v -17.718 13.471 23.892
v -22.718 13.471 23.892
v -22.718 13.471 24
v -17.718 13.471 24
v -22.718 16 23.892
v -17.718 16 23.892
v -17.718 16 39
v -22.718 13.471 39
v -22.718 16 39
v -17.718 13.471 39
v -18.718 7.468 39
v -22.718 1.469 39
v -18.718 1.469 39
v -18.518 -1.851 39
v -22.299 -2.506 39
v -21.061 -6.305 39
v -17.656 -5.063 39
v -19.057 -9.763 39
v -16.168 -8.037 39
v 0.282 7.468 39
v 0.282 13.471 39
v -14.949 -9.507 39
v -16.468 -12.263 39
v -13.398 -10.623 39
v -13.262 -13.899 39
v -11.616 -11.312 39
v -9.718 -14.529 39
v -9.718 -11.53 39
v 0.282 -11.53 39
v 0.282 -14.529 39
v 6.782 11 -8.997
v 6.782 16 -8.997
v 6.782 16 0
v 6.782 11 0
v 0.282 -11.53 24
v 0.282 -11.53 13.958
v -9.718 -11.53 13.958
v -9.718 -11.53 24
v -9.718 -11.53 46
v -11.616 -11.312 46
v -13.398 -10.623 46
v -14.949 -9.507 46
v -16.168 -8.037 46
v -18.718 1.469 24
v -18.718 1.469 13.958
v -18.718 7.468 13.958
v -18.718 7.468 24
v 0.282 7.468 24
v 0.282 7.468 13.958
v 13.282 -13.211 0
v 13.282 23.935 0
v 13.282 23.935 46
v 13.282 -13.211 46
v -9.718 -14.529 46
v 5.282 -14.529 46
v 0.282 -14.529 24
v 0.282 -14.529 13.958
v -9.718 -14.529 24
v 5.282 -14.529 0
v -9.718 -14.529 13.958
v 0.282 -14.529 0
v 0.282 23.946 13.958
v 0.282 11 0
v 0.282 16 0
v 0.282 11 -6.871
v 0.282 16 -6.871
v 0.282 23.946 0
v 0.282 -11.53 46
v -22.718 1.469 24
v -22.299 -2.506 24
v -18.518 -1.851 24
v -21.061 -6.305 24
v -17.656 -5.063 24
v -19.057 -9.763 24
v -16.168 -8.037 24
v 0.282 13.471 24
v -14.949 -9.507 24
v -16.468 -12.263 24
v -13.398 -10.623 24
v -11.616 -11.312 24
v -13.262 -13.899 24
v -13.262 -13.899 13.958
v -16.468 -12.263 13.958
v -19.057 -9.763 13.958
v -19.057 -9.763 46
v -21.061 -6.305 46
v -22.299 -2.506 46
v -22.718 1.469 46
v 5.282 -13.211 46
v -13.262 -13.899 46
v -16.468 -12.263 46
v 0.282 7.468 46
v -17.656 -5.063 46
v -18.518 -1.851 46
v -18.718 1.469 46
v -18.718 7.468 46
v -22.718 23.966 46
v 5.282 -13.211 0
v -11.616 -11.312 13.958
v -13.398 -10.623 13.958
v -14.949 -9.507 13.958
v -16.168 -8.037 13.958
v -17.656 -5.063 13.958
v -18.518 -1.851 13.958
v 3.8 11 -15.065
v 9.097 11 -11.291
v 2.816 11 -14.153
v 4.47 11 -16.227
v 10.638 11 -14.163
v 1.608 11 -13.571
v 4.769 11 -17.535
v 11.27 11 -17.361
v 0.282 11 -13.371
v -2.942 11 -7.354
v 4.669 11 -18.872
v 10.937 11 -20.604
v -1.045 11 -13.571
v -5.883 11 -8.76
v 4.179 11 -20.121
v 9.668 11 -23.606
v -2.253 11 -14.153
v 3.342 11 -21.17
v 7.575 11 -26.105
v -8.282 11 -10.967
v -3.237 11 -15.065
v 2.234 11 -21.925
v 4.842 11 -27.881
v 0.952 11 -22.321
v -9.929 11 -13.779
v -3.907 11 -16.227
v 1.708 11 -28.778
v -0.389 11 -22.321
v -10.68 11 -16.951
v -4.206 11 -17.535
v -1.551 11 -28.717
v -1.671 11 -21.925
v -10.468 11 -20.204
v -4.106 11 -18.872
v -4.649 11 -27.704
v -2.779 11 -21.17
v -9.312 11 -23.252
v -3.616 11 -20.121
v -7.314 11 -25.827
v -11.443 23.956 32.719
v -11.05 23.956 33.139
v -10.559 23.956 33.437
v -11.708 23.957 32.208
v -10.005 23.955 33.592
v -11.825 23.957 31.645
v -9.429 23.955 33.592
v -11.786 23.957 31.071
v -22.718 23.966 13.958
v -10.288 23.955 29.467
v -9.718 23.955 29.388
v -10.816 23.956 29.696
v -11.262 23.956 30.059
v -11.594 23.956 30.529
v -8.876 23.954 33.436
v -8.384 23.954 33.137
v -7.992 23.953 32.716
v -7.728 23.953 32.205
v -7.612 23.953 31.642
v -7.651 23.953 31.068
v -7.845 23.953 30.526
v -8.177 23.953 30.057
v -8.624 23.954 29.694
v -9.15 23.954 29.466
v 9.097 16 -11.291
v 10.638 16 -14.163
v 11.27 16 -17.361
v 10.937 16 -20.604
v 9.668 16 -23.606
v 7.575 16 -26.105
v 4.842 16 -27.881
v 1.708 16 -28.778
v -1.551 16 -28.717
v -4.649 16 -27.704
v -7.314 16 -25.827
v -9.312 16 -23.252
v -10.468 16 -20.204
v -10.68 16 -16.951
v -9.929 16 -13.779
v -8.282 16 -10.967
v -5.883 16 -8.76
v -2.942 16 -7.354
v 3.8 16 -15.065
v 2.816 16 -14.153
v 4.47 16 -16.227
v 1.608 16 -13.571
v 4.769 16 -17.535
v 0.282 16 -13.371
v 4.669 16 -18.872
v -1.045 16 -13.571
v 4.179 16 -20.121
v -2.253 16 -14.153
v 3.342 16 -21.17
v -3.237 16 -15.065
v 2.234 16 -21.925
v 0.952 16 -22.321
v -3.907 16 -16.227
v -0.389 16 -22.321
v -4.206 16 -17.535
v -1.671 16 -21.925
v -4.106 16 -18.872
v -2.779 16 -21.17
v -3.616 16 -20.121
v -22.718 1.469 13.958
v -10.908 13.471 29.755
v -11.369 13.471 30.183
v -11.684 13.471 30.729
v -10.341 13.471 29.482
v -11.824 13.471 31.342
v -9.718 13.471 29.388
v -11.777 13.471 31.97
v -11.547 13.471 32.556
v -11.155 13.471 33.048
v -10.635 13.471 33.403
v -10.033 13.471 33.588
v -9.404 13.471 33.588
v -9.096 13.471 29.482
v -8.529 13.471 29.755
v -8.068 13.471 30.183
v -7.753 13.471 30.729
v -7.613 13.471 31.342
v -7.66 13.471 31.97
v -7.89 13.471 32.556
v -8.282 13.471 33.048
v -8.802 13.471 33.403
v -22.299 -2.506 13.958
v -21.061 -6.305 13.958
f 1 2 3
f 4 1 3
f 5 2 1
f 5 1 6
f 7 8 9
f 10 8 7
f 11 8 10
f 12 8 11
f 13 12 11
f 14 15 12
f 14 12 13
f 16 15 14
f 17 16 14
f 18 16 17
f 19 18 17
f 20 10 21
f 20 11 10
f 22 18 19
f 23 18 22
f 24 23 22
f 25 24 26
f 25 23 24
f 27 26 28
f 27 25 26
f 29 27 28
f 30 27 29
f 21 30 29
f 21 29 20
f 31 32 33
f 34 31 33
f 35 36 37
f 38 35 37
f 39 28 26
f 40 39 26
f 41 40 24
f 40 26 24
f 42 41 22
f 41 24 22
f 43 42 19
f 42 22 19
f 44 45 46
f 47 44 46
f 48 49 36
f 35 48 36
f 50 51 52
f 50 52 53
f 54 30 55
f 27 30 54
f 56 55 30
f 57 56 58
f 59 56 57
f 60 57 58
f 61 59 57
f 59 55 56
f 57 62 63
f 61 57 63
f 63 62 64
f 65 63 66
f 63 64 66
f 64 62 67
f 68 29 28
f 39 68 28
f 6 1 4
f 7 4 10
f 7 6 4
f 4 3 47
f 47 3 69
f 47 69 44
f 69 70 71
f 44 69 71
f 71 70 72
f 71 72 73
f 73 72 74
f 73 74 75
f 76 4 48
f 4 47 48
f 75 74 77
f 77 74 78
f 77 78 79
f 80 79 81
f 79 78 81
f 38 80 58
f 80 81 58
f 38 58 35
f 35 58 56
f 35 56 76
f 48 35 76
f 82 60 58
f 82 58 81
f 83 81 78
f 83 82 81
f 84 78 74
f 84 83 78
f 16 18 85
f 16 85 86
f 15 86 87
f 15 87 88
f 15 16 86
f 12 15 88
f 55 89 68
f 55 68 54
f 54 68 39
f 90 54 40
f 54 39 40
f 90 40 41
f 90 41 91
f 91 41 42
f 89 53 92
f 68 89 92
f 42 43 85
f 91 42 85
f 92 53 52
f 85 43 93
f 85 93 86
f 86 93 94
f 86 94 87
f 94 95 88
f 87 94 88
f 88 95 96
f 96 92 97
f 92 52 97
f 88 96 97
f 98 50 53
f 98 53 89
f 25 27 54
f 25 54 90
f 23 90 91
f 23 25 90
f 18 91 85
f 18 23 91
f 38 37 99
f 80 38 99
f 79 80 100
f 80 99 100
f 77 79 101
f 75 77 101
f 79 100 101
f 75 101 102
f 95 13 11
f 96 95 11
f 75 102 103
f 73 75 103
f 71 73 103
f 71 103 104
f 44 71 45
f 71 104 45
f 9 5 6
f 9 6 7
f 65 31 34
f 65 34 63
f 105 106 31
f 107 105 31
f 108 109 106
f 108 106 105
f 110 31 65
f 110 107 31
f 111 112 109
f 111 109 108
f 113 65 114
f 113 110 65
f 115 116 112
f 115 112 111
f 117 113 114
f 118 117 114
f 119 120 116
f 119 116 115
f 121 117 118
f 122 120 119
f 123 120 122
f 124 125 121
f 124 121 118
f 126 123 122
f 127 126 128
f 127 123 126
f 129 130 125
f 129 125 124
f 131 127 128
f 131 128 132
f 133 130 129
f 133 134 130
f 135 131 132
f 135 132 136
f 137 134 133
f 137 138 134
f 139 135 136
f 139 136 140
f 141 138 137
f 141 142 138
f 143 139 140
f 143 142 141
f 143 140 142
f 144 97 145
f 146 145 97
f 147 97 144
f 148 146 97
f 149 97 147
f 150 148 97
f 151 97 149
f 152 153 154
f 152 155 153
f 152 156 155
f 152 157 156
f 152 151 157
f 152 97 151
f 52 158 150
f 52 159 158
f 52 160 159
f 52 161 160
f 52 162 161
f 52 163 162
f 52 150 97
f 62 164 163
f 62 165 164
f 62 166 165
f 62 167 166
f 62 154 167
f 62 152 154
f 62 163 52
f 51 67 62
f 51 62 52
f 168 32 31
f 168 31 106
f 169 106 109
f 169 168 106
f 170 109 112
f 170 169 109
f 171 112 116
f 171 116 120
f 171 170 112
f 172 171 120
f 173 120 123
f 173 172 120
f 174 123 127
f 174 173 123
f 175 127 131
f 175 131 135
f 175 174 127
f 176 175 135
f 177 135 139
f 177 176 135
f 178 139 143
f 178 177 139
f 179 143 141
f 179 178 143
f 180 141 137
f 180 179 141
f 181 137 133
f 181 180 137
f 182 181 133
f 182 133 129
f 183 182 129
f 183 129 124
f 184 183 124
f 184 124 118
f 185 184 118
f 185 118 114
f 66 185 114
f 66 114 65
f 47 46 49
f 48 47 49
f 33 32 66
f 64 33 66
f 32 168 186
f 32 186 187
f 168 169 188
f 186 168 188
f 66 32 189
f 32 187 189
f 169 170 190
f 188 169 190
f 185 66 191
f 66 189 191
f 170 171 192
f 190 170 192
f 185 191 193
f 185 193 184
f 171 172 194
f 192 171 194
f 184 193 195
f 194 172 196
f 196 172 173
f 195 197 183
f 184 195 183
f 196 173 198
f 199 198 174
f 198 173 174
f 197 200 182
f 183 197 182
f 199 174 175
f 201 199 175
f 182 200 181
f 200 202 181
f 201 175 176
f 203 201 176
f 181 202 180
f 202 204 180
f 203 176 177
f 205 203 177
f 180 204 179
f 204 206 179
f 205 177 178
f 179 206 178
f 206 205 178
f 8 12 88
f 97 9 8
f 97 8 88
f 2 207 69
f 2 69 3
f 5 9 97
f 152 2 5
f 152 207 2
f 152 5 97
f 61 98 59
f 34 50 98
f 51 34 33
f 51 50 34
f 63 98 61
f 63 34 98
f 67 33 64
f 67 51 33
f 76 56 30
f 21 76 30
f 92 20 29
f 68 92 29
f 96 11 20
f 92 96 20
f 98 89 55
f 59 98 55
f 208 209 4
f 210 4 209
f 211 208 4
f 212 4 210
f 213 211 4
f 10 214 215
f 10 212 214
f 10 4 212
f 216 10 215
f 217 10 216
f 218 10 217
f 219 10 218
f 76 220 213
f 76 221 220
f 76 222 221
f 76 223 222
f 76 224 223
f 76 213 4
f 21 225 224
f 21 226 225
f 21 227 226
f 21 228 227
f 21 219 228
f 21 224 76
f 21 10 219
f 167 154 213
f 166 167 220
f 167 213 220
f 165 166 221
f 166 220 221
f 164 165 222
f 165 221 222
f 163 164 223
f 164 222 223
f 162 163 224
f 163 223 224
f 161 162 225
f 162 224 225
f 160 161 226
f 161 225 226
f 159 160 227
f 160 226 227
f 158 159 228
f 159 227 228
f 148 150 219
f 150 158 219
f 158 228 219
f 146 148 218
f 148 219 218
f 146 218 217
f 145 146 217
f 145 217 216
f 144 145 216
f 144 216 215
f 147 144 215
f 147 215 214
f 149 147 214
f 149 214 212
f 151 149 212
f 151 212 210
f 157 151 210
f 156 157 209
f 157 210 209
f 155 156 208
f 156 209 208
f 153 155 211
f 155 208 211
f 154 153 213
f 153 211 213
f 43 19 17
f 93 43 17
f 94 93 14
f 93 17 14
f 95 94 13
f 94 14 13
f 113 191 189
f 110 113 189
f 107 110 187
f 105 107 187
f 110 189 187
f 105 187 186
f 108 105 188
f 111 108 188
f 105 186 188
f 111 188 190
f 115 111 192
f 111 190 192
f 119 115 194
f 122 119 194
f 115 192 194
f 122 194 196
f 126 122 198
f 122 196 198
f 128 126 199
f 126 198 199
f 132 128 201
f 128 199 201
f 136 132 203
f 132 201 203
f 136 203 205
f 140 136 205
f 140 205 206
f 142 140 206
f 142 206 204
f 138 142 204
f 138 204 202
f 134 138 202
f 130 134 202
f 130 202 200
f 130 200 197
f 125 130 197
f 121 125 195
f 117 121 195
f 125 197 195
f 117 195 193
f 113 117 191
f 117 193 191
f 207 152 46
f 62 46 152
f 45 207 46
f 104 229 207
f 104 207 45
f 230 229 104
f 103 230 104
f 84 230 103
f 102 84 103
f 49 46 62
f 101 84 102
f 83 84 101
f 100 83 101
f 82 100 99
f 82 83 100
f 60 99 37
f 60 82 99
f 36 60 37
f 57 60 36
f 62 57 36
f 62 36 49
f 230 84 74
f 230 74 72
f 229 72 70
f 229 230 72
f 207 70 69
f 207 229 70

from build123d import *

# Parameters (mm, degrees)
BOSS_EXTRUDE1_DEPTH = 46
SKETCH3_W           = 23
SKETCH3_H           = 15
CUT_EXTRUDE2_DEPTH  = 28
SKETCH4_W           = 23
SKETCH4_H           = 13.957917361
CUT_EXTRUDE3_DEPTH  = 69
SKETCH8_W           = 15.108089283
SKETCH8_H           = 2.529188453
CUT_EXTRUDE4_DEPTH  = 5
SKETCH9_R           = 2.111646756
CUT_EXTRUDE5_DEPTH  = 22
SKETCH7_R           = 11
SKETCH7_R_2         = 4.5
BOSS_EXTRUDE2_DEPTH = 5
BOSS_EXTRUDE3_DEPTH = 5


with BuildPart() as part:
    # Sketch1 → Boss-Extrude1 (new body)
    with BuildSketch(Plane.XY):
        with BuildLine():
            Line((-22.718454064, 23.966100395), (13.281542119, 23.93479699))
            Line((13.281542119, 23.93479699), (13.281542119, -13.210798183))
            Line((13.281542119, -13.210798183), (5.281545459, -13.210798183))
            Line((5.281545459, -13.210798183), (5.281545459, -14.529188453))
            Line((5.281545459, -14.529188453), (-9.718454064, -14.529188453))
            ThreePointArc((-9.718454064, -14.529188453), (-14.925713646, -13.200176165), (-19.056981743, -9.762960731))
            ThreePointArc((-19.056981743, -9.762960731), (-21.779979177, -4.437922335), (-22.718454064, 1.468854607))
            Line((-22.718454064, 1.468854607), (-22.718454064, 23.966100395))
        make_face()
        with BuildLine():
            Line((-18.718455971, 7.468114556), (0.281544029, 7.468114556))
            Line((0.281544029, 7.468114556), (0.281544029, -11.529558479))
            Line((0.281544029, -11.529558479), (-9.718454064, -11.529558479))
            ThreePointArc((-9.718454064, -11.529558479), (-13.398330557, -10.623193541), (-16.168405236, -8.036752998))
            ThreePointArc((-16.168405236, -8.036752998), (-18.168441603, -3.478446477), (-18.718455971, 1.468854607))
            Line((-18.718455971, 1.468854607), (-18.718455971, 7.468114556))
        make_face(mode=Mode.SUBTRACT)
    extrude(amount=BOSS_EXTRUDE1_DEPTH)

    # Sketch3 → Cut-Extrude2 (cut)
    with BuildSketch(Plane.XZ.offset(14.529188453)):
        with Locations((-11.218454064, 31.5)):
            Rectangle(SKETCH3_W, SKETCH3_H)
    extrude(amount=-CUT_EXTRUDE2_DEPTH, mode=Mode.SUBTRACT)

    # Sketch4 → Cut-Extrude3 (cut)
    with BuildSketch(Plane.XZ.offset(14.529188453)):
        with Locations((-11.218454064, 6.978958681)):
            Rectangle(SKETCH4_W, SKETCH4_H)
    extrude(amount=-CUT_EXTRUDE3_DEPTH, mode=Mode.SUBTRACT)

    # Sketch8 → Cut-Extrude4 (cut)
    with BuildSketch(Plane.ZY.offset(22.718454064)):
        with Locations((31.445955359, 14.735405774)):
            Rectangle(SKETCH8_W, SKETCH8_H)
    extrude(amount=-CUT_EXTRUDE4_DEPTH, mode=Mode.SUBTRACT)

    # Sketch9 → Cut-Extrude5 (cut)
    with BuildSketch(Plane.XZ.offset(-13.470811547)):
        with Locations(Location((-9.718454064, 31.5, 0), (0, 0, 270))):
            Circle(SKETCH9_R)
    extrude(amount=-CUT_EXTRUDE5_DEPTH, mode=Mode.SUBTRACT)



with BuildPart() as body_2:
    # Sketch7 → Boss-Extrude2 (new body)
    with BuildSketch(Plane(origin=(0, 16, 0), x_dir=(1, 0, 0), z_dir=(0, 1, 0))):
        with Locations(Location((0.281545936, 17.870886738, 0), (0, 0, 270))):
            Circle(SKETCH7_R)
        with Locations(Location((0.281545936, 17.870886738, 0), (0, 0, 270))):
            Circle(SKETCH7_R_2, mode=Mode.SUBTRACT)
    extrude(amount=-BOSS_EXTRUDE2_DEPTH)


with BuildPart() as part_1:
    add(part.part)

    add(body_2.part)  # Boss-Extrude3 merges body 2
    # Sketch10 → Boss-Extrude3 (add)
    with BuildSketch(Plane(origin=(0, 16, 0), x_dir=(1, 0, 0), z_dir=(0, 1, 0))):
        with BuildLine():
            Line((0.281545936, 0), (0.281545936, 6.870886738))
            ThreePointArc((0.281545936, 6.870886738), (3.700951455, 7.415856087), (6.781544028, 8.996765665))
            Line((6.781544028, 8.996765665), (6.781544028, 0))
            Line((6.781544028, 0), (0.281545936, 0))
        make_face()
    extrude(amount=-BOSS_EXTRUDE3_DEPTH)


solid = part_1.part
